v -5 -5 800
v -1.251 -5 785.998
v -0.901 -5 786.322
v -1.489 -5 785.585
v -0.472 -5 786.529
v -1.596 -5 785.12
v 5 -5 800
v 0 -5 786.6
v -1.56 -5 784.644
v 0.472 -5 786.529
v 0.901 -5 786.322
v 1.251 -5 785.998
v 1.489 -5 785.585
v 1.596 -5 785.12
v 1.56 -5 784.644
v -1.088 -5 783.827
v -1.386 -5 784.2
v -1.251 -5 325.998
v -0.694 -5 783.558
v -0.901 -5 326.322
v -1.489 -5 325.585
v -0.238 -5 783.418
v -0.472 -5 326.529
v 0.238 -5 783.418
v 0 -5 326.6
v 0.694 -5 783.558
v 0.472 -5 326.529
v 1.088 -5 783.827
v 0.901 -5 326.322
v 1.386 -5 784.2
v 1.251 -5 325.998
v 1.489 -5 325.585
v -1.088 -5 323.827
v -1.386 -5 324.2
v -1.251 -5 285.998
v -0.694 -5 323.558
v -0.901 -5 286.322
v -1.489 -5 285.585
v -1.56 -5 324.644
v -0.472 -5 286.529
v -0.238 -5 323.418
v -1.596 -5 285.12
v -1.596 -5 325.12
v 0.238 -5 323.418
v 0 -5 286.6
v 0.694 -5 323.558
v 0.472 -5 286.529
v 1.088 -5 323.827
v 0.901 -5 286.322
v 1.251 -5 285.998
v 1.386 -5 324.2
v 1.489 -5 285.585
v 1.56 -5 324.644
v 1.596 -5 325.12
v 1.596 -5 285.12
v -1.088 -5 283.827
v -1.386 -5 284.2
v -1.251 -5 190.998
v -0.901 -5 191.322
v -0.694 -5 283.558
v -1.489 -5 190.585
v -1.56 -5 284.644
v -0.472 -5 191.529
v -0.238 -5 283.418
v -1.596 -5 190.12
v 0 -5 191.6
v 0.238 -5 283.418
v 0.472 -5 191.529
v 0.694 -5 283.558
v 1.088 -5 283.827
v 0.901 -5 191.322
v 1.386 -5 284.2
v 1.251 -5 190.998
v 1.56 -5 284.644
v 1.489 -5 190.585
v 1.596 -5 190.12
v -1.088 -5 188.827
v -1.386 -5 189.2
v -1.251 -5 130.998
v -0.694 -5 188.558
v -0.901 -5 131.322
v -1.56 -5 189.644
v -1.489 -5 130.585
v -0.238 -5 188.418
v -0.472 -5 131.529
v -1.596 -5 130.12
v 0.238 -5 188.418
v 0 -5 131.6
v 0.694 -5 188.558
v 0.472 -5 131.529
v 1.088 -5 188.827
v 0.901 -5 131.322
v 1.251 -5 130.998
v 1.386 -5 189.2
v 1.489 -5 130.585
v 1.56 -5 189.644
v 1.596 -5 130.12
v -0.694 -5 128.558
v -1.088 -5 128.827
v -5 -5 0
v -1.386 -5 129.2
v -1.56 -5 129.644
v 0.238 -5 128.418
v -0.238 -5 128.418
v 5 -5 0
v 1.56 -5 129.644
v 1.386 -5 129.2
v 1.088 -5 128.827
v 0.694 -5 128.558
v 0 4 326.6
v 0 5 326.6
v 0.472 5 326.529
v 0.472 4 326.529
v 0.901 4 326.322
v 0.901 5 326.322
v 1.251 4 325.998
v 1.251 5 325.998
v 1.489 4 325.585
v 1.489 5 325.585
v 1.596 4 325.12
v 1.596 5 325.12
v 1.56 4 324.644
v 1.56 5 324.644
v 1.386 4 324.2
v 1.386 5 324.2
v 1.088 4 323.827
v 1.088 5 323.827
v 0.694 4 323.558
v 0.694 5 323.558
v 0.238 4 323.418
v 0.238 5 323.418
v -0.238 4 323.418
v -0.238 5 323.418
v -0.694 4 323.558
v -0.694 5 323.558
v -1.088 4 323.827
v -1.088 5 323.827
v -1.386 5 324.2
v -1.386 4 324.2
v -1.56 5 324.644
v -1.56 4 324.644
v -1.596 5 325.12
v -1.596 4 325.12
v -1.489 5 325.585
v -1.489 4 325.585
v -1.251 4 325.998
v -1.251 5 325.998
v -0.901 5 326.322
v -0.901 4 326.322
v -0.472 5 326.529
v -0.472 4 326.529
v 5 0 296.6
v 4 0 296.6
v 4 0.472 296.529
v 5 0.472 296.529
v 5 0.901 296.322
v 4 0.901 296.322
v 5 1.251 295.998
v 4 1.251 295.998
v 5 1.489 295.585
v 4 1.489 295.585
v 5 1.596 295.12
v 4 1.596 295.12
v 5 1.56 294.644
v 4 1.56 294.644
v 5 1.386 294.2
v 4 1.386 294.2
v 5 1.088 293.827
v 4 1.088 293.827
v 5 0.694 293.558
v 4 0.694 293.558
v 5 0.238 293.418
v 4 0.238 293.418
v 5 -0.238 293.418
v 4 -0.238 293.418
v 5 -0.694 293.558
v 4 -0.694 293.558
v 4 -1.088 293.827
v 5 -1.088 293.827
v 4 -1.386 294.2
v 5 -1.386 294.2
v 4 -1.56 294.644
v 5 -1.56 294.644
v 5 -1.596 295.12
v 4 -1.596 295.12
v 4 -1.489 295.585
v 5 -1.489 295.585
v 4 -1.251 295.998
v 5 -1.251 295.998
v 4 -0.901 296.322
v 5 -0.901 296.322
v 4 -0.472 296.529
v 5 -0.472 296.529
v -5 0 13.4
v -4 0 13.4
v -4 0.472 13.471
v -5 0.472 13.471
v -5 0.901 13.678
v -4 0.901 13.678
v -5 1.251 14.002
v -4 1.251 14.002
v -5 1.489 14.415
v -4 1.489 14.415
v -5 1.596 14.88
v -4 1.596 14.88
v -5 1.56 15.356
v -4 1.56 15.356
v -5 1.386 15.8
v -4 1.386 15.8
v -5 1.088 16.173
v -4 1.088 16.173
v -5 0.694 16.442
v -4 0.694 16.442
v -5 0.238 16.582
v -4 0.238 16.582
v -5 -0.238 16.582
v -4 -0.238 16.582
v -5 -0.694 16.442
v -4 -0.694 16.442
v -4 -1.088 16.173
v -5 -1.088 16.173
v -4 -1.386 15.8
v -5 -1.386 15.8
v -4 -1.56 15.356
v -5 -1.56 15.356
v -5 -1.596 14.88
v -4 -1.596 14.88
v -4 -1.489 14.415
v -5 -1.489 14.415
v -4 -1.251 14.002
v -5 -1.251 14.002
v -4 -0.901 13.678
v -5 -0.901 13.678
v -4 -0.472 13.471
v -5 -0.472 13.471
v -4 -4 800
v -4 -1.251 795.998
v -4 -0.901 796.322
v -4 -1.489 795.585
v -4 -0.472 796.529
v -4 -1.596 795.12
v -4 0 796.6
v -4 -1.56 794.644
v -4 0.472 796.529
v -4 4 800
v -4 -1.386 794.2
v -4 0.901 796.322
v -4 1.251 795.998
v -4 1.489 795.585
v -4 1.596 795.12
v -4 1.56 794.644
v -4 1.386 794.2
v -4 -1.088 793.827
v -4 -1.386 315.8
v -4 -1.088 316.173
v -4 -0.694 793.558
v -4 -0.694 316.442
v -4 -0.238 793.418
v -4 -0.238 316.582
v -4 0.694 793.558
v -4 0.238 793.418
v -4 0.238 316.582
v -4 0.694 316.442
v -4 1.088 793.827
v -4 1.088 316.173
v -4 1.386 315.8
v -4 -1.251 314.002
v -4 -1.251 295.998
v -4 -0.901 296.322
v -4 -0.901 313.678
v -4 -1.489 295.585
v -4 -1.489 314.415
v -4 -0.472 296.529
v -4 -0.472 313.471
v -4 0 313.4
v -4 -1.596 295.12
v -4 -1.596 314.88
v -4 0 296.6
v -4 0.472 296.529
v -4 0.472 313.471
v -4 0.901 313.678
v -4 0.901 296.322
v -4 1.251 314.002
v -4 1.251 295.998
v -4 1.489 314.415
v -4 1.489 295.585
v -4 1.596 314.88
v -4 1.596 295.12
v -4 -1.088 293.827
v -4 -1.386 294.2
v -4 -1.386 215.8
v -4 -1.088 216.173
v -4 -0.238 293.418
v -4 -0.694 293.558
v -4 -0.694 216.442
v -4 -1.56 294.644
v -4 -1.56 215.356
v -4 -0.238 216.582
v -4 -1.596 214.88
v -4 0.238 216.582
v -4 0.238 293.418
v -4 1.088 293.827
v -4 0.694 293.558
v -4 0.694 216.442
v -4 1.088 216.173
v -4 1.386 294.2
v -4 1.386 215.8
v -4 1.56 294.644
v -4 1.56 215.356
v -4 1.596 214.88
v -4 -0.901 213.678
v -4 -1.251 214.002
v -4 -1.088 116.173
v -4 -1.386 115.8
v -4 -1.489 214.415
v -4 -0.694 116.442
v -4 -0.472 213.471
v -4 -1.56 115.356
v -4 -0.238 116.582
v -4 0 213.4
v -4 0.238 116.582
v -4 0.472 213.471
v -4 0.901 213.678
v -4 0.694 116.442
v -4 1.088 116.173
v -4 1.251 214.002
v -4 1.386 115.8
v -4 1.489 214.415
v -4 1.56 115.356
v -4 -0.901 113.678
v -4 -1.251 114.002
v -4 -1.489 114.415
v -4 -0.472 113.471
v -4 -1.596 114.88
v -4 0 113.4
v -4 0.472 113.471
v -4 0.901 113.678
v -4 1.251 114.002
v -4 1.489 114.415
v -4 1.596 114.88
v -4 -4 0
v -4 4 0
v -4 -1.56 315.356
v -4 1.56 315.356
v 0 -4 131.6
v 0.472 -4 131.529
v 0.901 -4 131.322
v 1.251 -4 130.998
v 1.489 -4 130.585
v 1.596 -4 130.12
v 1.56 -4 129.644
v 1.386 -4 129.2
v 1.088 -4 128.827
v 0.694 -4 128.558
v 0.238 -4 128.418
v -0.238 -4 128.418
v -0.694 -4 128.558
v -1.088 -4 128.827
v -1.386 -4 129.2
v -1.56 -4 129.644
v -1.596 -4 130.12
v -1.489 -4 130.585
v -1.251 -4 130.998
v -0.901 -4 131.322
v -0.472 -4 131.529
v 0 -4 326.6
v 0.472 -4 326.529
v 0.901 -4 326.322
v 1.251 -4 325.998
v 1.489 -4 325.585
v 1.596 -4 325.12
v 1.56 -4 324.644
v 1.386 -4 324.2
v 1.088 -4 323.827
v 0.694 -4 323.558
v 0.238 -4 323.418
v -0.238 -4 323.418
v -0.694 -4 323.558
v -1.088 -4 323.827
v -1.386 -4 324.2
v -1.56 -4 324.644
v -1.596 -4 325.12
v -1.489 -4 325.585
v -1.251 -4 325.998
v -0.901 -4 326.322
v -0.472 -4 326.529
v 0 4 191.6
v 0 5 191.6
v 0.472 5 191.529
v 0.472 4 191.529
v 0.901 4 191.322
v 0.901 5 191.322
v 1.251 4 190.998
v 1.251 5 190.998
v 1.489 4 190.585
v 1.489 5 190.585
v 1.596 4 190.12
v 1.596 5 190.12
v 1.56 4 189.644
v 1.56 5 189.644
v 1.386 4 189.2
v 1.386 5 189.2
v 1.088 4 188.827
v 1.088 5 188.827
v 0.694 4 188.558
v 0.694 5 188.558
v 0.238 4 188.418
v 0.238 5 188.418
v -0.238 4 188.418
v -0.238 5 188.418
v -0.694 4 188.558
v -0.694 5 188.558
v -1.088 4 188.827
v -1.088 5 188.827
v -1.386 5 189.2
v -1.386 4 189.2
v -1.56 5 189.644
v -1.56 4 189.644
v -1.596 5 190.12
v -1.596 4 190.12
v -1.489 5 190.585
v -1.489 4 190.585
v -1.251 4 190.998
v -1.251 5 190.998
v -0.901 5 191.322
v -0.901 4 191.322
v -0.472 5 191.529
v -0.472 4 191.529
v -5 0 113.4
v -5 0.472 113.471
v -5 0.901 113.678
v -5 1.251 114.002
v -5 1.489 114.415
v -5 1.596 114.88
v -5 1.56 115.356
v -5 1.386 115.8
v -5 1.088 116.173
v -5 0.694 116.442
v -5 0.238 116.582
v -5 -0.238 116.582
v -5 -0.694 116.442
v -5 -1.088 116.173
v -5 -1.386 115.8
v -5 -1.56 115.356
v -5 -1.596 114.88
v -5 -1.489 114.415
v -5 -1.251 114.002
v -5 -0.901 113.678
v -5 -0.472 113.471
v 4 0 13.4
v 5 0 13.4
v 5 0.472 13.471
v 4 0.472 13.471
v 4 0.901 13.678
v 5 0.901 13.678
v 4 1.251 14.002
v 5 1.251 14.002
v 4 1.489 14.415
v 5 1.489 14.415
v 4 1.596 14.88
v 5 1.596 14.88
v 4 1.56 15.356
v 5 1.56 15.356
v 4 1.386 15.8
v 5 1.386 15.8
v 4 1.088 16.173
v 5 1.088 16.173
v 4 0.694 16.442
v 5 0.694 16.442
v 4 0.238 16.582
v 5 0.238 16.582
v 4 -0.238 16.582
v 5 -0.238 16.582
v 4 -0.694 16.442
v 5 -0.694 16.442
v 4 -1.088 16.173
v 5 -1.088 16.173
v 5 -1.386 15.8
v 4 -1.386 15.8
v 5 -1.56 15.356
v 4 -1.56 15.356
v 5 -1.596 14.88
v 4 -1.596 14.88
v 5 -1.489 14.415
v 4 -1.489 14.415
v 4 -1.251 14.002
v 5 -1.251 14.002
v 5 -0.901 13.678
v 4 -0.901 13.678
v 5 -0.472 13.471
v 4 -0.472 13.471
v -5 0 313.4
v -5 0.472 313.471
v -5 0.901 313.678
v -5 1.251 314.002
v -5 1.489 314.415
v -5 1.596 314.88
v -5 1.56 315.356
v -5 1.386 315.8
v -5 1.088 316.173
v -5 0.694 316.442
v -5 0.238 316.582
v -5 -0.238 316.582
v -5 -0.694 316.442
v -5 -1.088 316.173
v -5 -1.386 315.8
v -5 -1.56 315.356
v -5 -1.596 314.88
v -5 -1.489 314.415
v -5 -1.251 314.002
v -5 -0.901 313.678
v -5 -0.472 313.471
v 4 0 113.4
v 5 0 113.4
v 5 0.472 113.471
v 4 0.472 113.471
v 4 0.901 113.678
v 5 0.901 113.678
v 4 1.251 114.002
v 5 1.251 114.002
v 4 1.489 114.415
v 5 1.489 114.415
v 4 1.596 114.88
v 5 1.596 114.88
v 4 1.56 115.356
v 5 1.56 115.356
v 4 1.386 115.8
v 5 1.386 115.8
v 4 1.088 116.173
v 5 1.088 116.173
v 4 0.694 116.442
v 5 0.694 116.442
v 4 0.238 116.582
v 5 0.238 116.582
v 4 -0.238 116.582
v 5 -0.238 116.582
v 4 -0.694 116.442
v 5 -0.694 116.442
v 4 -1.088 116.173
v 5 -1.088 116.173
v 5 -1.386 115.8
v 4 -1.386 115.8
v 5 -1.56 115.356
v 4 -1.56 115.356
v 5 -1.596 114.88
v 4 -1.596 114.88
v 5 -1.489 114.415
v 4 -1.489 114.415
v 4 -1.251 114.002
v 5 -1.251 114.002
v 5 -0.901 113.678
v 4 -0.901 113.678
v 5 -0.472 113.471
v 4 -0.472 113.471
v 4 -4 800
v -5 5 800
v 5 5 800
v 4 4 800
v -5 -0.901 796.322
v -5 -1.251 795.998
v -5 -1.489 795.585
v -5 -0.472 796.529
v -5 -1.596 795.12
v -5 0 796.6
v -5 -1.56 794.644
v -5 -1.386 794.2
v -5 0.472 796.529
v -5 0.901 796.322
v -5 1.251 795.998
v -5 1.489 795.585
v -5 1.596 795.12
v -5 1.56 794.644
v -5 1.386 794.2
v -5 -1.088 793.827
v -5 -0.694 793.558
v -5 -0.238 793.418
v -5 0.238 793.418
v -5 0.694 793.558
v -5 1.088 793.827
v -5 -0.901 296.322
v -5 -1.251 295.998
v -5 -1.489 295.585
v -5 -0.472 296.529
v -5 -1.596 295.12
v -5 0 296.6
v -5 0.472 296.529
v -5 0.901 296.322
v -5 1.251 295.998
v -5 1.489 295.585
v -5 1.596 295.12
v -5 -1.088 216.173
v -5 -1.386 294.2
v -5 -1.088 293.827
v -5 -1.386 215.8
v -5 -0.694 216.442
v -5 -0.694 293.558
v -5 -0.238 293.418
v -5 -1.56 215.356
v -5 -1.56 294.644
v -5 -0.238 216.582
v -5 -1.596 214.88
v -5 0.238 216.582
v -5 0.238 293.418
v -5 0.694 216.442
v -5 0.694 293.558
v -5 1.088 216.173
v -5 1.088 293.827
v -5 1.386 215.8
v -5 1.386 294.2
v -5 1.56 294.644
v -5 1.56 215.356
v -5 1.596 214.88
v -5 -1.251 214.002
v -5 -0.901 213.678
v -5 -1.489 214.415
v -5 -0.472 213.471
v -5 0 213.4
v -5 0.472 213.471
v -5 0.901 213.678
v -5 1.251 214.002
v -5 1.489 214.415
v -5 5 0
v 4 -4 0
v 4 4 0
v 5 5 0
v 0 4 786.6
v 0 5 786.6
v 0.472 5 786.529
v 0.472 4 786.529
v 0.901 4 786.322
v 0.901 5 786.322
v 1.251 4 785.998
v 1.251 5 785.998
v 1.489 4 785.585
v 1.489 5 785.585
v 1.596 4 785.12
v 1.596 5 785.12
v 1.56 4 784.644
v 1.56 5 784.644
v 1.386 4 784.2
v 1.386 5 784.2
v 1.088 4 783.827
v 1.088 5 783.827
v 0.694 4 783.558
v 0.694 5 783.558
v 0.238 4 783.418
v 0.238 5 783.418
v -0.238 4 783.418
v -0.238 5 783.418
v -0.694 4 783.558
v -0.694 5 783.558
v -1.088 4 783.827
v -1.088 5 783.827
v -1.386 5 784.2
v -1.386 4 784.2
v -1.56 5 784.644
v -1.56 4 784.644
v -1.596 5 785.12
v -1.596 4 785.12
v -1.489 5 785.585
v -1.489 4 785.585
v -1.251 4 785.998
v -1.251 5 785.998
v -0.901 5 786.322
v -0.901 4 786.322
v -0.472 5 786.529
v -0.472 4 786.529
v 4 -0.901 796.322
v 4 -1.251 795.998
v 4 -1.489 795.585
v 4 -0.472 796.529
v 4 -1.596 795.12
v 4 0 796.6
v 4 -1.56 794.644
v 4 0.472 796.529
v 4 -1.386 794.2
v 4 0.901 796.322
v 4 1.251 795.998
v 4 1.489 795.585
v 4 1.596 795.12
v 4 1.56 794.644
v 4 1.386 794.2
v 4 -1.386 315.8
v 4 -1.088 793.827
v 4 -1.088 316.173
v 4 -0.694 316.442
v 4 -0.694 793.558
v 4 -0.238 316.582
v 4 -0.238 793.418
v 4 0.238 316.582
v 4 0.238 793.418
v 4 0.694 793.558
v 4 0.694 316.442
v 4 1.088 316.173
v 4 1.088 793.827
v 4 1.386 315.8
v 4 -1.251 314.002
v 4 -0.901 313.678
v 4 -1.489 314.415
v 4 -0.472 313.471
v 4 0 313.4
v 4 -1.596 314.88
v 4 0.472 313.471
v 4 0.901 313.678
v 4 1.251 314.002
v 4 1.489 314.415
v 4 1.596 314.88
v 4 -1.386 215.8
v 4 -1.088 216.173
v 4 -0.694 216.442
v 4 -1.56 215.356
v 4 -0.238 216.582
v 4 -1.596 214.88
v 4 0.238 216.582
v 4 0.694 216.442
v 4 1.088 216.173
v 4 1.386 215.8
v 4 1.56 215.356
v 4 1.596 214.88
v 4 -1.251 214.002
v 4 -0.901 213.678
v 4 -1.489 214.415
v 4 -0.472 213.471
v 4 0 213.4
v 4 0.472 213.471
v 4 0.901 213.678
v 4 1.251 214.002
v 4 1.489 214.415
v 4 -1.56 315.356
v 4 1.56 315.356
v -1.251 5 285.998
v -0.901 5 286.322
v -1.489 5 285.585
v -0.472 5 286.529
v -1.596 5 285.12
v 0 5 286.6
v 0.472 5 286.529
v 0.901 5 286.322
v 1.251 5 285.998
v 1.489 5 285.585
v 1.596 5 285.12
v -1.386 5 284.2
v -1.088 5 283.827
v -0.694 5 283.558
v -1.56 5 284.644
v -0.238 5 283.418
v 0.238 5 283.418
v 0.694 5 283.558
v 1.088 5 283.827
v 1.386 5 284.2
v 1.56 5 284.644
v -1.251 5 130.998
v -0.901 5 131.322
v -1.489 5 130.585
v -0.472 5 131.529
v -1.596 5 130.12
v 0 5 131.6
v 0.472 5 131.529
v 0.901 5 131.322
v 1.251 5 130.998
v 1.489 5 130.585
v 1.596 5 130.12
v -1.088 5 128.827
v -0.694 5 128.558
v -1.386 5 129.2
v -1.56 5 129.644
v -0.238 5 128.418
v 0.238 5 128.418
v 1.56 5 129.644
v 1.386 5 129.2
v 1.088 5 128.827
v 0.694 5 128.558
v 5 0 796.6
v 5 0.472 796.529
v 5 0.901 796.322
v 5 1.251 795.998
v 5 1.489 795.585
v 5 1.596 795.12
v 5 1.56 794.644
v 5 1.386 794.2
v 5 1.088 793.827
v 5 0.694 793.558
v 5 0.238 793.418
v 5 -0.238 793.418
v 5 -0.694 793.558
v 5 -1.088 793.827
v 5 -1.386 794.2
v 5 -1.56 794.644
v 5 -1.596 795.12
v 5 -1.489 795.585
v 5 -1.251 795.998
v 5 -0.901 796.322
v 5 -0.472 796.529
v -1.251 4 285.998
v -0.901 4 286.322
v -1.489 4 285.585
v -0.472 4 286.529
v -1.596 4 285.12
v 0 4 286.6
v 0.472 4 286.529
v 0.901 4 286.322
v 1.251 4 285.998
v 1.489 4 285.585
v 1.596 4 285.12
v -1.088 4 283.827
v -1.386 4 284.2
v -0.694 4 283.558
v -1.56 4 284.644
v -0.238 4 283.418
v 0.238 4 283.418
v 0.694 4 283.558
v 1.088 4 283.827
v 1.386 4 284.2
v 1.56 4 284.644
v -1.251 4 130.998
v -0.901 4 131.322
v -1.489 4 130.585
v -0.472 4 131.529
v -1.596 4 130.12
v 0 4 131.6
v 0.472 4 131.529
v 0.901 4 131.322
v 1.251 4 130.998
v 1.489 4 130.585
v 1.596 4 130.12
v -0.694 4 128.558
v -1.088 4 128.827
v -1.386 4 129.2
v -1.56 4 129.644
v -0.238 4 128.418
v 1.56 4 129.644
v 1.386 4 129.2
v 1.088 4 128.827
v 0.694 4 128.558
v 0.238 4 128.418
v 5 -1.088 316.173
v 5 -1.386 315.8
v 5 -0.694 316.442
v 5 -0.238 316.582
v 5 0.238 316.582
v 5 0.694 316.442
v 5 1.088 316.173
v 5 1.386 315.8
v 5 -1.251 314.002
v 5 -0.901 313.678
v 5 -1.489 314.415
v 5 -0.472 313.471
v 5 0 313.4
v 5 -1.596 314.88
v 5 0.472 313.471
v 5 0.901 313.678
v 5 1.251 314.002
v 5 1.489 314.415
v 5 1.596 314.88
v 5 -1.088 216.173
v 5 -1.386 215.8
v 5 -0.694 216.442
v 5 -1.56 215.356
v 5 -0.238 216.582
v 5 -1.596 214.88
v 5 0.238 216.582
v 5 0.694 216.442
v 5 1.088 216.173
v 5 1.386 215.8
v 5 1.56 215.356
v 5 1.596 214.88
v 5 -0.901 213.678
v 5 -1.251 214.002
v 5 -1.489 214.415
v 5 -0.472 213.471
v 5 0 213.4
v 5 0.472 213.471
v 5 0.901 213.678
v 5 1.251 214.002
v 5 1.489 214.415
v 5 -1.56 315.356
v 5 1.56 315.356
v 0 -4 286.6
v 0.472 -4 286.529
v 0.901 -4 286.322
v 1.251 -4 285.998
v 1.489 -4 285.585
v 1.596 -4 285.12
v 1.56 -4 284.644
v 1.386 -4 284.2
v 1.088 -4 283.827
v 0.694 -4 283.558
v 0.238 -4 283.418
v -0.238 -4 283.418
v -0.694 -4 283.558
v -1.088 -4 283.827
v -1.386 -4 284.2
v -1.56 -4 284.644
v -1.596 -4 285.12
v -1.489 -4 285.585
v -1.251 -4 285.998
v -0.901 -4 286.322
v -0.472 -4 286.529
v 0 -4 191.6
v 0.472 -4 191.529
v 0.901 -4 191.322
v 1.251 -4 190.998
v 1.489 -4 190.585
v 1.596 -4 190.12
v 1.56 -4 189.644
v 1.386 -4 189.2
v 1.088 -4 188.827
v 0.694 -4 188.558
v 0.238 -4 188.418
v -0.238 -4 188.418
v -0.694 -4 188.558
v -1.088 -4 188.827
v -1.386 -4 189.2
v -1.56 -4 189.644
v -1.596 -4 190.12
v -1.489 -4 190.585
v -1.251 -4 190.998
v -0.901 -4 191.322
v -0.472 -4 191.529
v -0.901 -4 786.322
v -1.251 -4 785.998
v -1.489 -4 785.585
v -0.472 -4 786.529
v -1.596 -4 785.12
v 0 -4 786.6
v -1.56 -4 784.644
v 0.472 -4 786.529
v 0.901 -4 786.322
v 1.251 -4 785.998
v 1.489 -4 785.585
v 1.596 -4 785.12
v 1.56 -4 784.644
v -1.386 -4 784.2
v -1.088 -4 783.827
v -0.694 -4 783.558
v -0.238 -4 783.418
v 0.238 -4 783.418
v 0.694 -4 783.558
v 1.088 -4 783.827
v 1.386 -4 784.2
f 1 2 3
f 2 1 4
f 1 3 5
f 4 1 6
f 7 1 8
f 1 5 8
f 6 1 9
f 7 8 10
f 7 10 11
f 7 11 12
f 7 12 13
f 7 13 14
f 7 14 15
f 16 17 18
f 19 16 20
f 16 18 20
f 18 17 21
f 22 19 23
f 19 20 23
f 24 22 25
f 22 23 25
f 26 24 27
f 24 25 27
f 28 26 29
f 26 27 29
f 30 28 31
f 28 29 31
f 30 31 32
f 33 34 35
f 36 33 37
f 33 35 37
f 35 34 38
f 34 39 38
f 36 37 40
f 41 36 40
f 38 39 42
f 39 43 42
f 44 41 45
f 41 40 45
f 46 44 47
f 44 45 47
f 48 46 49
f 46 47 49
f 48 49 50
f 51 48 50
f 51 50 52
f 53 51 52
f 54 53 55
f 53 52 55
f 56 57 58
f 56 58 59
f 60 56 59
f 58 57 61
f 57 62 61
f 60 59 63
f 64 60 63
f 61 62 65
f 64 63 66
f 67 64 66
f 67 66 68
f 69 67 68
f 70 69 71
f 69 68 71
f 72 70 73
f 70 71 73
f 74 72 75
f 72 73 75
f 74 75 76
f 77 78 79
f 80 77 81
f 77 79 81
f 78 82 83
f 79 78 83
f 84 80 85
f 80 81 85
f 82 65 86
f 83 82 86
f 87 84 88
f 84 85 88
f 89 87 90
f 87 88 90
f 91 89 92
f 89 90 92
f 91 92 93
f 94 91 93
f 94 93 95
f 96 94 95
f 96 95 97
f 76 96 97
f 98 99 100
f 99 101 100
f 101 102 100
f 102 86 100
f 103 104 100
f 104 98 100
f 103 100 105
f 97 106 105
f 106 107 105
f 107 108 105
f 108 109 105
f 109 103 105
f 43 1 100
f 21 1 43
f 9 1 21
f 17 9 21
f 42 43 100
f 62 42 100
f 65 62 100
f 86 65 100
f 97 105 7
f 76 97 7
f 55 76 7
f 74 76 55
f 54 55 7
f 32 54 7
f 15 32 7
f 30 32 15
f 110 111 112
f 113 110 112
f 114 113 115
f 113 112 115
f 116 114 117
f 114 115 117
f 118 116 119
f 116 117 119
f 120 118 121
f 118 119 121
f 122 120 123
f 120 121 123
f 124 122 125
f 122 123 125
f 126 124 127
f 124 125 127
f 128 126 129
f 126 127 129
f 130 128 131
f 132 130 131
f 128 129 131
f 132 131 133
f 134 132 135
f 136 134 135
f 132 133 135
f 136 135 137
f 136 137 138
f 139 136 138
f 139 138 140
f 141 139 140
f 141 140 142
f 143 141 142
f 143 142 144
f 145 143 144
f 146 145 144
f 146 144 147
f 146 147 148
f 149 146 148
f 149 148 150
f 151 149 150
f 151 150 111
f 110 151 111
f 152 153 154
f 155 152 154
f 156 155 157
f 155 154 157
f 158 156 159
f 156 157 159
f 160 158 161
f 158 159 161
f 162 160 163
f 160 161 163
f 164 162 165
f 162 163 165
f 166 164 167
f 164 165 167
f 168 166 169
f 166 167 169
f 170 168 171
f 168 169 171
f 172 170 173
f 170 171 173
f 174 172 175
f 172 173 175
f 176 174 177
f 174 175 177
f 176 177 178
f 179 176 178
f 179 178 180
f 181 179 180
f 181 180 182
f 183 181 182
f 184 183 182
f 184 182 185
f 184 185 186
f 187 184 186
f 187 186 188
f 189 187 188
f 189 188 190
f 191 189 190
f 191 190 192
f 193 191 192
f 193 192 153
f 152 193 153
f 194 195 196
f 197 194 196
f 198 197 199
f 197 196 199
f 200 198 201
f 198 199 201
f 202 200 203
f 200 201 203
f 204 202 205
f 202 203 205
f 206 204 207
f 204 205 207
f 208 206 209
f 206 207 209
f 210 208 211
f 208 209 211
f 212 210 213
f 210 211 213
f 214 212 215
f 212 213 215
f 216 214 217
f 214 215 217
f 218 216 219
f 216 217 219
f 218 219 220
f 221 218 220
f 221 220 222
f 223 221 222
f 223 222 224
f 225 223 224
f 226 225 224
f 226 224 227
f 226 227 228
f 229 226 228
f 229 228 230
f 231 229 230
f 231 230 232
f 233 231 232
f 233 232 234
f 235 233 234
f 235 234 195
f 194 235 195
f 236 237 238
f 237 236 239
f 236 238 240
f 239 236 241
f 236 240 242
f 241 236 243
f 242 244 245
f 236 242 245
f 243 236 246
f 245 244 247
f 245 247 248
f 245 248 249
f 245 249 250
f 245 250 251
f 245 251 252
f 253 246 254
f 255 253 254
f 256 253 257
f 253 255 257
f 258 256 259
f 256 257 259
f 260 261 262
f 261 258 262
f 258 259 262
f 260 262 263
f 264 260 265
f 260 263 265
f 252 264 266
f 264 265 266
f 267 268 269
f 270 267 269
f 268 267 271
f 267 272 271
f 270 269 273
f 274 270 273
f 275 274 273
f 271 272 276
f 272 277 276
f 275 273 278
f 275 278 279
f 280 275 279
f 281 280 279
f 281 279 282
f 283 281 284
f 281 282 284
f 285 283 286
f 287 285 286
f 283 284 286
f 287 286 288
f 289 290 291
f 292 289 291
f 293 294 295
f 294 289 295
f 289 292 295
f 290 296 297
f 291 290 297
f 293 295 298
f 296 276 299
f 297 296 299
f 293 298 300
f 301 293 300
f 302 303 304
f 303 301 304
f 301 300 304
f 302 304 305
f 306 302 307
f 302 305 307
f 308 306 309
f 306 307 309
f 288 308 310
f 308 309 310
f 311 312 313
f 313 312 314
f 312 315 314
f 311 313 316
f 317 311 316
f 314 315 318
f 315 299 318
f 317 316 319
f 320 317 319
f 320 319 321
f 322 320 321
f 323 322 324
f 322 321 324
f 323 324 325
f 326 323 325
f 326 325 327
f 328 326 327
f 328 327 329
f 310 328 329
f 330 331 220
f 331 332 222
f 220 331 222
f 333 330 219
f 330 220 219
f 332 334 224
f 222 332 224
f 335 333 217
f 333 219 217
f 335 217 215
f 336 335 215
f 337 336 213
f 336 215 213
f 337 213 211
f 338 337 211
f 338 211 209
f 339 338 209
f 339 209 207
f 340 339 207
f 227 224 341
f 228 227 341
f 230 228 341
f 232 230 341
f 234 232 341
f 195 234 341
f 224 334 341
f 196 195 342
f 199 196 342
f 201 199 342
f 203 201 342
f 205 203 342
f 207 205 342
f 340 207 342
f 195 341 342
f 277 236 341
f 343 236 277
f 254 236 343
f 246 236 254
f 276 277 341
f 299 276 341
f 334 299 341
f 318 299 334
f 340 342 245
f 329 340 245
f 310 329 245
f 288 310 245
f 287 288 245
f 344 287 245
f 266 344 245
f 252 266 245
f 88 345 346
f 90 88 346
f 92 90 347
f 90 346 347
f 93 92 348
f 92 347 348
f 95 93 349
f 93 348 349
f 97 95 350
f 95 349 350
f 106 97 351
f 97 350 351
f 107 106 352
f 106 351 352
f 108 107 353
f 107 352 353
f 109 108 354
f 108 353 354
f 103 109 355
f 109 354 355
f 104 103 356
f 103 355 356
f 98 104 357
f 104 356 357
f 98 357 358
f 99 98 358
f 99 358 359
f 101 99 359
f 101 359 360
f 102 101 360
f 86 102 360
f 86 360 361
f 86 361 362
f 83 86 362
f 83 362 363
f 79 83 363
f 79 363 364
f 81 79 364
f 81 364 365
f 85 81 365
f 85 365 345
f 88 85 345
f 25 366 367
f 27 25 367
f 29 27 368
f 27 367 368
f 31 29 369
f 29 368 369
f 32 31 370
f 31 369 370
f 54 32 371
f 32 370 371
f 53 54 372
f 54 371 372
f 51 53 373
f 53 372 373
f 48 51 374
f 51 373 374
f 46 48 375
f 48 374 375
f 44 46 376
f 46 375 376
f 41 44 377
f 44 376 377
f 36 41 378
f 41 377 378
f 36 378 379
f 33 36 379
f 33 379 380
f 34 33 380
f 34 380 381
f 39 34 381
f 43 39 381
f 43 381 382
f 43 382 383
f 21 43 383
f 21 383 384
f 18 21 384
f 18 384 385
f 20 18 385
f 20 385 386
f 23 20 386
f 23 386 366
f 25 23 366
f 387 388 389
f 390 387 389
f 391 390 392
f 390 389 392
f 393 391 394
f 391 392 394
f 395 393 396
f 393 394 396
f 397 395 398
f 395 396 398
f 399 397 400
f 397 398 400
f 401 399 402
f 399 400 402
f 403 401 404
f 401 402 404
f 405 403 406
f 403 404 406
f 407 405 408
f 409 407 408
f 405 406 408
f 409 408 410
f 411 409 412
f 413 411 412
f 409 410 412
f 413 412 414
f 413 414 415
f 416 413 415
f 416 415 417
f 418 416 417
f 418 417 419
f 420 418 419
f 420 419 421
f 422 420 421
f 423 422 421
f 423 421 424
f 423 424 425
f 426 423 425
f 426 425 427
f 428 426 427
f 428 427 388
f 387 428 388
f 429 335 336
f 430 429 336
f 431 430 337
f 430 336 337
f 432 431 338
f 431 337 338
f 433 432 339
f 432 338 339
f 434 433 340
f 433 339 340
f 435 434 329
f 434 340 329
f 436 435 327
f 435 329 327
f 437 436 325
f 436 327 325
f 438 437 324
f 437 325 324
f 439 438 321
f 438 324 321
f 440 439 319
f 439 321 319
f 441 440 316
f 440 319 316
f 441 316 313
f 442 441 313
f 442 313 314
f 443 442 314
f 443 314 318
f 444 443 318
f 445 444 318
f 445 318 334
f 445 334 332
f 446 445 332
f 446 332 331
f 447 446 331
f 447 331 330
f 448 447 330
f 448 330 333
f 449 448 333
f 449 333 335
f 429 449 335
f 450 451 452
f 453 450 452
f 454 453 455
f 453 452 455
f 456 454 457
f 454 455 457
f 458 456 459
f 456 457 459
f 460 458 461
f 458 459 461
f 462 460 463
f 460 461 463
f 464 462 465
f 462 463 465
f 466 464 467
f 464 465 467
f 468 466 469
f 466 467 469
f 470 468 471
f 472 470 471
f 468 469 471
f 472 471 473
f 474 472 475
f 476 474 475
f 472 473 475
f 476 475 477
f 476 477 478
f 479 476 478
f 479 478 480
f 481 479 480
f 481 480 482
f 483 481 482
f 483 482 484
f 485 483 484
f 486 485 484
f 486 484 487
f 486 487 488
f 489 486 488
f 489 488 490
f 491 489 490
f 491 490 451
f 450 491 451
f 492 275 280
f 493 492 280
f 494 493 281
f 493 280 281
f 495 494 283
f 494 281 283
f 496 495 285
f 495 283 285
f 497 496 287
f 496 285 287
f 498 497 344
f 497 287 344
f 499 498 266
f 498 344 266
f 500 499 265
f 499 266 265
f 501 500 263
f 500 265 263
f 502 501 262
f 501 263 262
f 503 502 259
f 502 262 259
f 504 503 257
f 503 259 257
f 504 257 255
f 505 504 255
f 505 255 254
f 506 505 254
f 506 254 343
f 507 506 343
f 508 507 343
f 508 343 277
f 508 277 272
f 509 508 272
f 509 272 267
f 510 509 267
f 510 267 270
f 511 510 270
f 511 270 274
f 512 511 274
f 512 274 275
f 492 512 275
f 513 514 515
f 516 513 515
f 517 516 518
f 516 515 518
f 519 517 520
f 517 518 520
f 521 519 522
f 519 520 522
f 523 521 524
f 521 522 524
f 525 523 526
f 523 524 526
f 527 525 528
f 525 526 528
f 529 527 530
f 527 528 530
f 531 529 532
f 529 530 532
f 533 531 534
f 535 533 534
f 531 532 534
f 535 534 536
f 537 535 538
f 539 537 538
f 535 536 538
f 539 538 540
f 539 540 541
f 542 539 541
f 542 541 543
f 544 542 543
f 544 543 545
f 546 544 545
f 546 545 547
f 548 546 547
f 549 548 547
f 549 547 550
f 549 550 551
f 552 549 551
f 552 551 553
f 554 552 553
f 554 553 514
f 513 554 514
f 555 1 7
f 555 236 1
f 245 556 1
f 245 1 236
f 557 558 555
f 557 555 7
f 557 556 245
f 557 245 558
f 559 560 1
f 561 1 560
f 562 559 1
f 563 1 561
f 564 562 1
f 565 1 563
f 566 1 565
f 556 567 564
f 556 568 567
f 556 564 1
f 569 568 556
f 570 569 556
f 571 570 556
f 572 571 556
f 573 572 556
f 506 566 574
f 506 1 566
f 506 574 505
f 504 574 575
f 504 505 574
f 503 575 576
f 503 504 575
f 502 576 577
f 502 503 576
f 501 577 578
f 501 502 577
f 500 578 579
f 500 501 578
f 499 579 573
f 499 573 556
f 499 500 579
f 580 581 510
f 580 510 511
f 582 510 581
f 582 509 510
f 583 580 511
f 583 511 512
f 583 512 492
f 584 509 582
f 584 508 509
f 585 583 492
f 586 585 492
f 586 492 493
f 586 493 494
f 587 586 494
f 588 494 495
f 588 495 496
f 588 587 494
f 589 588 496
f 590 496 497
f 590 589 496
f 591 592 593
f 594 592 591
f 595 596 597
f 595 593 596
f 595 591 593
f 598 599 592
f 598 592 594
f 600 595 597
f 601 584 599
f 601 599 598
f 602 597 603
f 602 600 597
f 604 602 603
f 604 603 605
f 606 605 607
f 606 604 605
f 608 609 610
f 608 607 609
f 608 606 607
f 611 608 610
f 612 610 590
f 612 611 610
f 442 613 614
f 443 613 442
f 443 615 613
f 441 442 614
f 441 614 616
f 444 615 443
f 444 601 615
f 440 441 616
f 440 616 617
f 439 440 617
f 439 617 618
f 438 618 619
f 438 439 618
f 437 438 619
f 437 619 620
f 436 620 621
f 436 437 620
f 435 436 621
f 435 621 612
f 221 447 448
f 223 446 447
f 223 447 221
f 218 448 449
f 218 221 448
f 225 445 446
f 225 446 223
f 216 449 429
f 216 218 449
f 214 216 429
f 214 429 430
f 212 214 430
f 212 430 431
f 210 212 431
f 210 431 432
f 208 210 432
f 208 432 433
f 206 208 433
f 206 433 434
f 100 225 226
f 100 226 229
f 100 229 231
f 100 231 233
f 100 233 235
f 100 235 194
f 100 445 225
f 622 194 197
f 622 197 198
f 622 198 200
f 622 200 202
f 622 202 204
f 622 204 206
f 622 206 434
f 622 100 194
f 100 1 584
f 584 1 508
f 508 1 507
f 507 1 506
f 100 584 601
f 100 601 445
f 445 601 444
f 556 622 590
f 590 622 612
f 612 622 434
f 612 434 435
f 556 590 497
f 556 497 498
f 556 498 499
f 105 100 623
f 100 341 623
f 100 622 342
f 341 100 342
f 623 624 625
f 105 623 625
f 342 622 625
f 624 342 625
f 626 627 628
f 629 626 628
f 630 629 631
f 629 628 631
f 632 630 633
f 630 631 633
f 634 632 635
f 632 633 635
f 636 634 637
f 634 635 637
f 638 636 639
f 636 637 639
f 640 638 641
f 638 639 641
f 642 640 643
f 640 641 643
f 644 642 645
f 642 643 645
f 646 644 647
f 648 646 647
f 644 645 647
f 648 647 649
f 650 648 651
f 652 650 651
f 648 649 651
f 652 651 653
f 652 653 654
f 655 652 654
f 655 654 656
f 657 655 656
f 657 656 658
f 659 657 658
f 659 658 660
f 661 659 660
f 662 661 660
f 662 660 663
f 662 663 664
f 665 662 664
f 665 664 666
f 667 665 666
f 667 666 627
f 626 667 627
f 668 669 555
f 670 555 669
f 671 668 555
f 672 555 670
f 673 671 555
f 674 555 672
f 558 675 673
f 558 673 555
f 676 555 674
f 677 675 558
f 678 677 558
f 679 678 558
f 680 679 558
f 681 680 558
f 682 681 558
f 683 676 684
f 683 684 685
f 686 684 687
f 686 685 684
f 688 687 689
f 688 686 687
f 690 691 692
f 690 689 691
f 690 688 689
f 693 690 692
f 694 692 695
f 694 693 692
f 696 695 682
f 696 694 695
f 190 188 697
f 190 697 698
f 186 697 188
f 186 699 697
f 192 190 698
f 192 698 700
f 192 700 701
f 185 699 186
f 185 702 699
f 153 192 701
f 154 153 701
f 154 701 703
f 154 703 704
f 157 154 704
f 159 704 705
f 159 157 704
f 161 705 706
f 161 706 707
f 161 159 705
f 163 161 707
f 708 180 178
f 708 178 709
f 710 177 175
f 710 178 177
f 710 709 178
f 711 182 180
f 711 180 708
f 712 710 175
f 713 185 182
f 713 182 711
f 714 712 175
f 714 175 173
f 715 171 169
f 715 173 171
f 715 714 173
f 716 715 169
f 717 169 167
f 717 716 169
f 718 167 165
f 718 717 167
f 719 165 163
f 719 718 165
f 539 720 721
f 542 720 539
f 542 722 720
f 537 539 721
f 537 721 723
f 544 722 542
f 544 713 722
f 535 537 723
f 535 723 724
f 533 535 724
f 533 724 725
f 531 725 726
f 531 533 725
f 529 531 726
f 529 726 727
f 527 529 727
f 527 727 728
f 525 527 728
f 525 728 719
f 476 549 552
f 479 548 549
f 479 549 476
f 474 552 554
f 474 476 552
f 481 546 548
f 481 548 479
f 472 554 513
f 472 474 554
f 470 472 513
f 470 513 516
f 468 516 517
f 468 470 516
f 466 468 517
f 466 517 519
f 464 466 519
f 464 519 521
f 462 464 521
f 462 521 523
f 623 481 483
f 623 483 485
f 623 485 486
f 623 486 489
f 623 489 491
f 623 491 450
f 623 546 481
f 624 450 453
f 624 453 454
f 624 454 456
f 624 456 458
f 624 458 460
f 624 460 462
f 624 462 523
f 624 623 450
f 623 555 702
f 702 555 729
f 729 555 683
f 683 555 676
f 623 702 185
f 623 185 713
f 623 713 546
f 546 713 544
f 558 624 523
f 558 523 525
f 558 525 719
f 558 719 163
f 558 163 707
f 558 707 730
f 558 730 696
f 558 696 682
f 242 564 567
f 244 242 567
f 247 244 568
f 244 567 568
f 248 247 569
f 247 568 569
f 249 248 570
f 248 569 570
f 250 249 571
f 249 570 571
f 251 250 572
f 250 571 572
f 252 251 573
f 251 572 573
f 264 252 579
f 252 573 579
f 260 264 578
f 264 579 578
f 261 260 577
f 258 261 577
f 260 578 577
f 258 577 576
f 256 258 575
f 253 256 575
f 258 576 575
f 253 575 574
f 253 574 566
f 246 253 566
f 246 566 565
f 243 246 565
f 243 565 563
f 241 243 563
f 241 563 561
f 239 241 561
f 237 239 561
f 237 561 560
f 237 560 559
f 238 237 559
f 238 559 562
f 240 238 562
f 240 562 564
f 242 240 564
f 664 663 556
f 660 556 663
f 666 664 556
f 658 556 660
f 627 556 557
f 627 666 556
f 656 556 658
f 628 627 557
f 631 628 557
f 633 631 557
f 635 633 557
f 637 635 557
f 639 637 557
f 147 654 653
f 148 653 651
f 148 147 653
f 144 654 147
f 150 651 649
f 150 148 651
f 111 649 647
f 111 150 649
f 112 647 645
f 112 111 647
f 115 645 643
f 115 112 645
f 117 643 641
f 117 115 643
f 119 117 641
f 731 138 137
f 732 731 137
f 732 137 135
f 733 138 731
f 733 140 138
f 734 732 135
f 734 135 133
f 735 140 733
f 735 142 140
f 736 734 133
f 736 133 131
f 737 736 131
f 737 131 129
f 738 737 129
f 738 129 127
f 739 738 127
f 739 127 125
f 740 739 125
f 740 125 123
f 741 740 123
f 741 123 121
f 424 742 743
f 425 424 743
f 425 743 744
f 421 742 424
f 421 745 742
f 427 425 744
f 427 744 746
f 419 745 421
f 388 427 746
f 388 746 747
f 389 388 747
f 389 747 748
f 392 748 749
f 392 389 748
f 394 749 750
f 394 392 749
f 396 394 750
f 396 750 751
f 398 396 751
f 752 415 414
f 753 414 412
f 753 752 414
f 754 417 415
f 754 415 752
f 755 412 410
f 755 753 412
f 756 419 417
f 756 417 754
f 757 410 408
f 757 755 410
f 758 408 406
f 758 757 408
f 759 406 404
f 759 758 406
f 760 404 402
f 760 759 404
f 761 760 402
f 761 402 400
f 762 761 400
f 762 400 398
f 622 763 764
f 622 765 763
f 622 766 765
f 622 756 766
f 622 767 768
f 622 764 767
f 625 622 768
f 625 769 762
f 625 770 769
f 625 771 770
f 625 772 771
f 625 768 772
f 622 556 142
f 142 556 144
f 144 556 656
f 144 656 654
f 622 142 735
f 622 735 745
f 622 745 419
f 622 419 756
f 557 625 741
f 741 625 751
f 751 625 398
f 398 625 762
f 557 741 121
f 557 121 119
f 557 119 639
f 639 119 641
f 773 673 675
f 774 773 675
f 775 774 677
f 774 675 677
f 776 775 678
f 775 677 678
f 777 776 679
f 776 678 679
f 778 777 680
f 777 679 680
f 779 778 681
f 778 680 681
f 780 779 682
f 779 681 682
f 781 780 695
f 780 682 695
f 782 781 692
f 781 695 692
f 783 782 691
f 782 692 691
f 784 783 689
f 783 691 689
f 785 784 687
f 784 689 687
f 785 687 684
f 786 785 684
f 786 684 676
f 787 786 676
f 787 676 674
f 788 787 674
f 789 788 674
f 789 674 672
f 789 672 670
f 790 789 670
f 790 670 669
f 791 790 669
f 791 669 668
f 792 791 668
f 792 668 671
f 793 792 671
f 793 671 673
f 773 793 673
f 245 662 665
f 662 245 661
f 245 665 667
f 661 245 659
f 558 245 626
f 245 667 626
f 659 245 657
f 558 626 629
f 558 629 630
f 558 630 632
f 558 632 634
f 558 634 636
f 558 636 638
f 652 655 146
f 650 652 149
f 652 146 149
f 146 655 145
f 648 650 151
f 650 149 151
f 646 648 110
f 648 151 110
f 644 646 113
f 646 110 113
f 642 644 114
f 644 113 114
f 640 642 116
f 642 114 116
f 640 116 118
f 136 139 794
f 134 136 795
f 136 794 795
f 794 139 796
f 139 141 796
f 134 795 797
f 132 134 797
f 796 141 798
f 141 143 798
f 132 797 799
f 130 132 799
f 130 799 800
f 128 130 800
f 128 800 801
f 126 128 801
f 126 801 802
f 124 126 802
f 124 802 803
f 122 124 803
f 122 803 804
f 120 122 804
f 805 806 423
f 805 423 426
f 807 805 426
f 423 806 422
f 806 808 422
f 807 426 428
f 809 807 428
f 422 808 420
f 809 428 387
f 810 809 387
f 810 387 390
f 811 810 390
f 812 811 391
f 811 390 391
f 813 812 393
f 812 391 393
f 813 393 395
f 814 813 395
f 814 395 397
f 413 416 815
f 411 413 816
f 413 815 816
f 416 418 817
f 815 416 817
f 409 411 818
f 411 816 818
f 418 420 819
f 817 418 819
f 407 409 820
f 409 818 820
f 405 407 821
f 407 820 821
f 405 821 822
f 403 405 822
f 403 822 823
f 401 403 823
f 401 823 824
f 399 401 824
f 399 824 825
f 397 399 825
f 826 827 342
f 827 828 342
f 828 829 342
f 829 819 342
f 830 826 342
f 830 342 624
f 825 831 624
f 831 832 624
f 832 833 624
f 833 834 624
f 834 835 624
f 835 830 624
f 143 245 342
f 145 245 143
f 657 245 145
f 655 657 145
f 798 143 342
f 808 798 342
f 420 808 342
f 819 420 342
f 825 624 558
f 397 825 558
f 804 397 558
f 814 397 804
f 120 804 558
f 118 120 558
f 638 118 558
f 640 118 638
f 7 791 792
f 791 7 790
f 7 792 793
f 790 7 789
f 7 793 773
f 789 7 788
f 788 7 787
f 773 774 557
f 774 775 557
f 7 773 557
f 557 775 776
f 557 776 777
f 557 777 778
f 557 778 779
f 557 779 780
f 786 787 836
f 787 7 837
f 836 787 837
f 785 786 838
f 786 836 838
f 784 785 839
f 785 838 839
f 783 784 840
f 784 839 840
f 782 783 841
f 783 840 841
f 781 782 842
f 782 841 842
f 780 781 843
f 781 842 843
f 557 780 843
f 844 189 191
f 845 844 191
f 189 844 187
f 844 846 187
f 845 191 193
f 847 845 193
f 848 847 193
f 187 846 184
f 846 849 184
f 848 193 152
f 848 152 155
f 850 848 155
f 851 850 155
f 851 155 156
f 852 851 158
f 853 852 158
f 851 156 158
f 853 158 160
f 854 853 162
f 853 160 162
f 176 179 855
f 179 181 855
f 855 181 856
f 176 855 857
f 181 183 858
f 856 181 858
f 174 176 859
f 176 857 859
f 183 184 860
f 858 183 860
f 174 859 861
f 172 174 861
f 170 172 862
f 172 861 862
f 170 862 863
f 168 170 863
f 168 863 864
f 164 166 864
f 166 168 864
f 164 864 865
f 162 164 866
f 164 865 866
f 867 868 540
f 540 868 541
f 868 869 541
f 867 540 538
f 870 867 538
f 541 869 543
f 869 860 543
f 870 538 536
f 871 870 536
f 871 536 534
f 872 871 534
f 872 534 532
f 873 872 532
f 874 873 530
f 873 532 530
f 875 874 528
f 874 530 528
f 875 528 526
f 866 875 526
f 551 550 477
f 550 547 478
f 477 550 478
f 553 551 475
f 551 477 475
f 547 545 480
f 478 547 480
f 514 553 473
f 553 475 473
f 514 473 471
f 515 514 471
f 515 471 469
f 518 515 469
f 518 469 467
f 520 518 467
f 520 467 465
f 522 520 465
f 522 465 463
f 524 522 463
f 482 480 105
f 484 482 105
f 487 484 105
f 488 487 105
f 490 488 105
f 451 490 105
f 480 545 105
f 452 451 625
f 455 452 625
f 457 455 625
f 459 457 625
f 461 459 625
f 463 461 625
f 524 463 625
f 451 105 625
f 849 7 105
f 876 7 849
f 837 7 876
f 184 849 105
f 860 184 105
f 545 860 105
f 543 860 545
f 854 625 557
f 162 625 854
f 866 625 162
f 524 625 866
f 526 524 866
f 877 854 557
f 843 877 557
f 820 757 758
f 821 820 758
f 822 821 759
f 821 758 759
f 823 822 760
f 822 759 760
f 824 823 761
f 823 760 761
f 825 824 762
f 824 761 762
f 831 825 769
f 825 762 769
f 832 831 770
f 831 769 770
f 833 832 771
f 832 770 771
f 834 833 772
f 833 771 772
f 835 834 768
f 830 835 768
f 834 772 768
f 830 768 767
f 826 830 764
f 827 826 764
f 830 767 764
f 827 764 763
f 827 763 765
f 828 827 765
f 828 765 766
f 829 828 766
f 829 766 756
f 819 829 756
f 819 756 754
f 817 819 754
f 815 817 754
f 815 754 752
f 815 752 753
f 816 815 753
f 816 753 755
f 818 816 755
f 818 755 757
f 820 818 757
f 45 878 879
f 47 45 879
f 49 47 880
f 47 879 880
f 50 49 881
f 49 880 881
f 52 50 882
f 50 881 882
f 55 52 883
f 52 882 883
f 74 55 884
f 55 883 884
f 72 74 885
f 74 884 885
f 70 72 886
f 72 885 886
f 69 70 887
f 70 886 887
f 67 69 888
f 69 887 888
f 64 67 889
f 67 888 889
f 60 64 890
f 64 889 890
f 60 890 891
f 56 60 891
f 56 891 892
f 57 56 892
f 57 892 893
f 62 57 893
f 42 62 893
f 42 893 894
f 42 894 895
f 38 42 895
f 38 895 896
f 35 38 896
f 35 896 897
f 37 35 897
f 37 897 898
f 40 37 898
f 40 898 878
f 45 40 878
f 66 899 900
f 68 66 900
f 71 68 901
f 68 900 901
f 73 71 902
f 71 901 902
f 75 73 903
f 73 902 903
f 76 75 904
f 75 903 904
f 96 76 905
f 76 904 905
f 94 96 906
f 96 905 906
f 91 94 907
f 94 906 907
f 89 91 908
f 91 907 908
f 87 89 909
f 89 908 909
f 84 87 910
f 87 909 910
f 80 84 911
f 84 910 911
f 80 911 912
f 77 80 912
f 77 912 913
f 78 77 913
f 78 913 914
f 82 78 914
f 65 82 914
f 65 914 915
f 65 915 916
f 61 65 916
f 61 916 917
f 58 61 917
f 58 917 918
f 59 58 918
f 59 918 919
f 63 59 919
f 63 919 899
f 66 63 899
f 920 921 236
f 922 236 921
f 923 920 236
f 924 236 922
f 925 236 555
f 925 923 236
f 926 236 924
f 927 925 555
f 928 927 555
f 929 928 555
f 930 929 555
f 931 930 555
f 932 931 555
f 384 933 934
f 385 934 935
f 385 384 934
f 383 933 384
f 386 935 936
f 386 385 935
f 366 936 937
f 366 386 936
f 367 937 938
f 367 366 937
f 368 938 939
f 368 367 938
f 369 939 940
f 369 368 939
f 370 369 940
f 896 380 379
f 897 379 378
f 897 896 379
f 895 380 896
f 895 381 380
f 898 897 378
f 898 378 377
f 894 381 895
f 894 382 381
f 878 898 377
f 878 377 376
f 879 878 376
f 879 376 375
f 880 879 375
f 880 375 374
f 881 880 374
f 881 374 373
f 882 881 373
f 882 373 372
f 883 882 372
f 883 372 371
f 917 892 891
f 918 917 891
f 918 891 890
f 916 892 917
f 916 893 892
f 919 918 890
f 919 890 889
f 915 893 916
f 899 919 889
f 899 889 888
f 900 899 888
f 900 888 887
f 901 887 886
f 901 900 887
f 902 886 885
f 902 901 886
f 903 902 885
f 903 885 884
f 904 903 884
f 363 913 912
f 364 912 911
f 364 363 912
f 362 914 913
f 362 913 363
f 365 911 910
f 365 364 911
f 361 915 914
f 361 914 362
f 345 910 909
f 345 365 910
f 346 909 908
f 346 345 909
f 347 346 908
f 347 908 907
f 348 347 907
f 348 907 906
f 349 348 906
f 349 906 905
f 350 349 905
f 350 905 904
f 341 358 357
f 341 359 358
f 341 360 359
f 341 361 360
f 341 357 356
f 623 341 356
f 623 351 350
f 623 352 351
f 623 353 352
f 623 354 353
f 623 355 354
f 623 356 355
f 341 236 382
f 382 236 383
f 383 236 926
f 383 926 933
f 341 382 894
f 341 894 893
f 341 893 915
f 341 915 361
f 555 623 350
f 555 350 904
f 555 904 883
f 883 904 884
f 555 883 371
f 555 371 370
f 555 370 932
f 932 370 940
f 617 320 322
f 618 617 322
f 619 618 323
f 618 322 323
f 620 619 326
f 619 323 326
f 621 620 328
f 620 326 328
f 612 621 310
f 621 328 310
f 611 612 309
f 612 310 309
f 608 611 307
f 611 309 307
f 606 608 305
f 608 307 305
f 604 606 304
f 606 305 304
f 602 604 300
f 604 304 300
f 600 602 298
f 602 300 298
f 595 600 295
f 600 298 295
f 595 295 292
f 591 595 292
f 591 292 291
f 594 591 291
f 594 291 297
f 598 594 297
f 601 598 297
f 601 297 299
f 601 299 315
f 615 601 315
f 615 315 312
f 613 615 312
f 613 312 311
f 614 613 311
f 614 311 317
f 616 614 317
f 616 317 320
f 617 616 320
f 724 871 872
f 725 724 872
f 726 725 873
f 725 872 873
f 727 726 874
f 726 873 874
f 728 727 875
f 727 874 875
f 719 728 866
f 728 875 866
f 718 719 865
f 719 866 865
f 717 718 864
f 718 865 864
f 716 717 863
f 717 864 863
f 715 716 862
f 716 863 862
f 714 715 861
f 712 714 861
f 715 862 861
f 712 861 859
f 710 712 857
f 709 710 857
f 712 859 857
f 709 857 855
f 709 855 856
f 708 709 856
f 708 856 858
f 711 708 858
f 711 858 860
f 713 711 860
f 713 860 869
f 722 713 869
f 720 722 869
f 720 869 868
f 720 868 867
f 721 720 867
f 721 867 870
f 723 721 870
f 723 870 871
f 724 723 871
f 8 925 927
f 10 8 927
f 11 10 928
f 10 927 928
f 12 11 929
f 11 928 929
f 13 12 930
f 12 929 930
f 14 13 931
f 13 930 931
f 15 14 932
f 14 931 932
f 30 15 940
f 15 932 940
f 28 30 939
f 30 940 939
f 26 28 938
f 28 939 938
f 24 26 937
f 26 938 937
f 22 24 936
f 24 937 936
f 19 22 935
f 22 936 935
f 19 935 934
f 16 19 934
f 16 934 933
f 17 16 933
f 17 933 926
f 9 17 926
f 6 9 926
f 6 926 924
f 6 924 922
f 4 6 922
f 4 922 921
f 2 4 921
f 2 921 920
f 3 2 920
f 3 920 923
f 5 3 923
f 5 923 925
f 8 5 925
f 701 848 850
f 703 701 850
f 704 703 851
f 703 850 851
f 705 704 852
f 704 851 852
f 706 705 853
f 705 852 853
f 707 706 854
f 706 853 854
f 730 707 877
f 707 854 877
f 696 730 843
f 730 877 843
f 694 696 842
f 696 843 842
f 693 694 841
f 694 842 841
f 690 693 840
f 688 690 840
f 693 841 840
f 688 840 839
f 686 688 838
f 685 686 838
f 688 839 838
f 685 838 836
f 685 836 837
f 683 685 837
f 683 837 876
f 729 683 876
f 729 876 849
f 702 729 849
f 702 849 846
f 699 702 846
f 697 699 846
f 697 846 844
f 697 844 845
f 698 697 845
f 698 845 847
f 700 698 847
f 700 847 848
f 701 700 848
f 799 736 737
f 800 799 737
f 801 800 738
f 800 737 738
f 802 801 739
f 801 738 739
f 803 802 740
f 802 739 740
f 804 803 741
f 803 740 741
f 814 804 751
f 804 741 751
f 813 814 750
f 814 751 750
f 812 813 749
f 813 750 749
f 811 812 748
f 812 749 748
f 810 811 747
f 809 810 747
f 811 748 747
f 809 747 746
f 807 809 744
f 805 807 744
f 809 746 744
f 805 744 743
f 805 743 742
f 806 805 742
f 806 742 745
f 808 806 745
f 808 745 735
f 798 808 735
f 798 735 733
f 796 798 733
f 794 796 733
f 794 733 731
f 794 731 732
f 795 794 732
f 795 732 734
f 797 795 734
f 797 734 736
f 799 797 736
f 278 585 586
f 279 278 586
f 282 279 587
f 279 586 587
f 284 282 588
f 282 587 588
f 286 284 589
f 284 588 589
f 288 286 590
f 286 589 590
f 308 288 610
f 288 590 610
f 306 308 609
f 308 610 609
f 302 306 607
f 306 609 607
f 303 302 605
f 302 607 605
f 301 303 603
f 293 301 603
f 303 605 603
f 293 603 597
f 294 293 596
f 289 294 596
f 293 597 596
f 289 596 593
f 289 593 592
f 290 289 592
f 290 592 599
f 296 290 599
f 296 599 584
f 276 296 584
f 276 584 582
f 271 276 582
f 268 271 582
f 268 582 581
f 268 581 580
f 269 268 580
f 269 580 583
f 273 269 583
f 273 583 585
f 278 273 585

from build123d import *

# Parameters (mm, degrees)
SKETCH_1_W             = 10
SKETCH_1_H             = 10
SKETCH_1_W_2           = 8
SKETCH_1_H_2           = 8
EXTRUDE_1_DEPTH        = 800
SKETCH_3_R             = 1.6
CUT_EXTRUDE_2_DEPTH    = 801.078121186
SKETCH_4_R             = 1.6
CUT_EXTRUDE_3_DEPTH    = 801.078121186
SKETCH_5_R             = 1.6
CUT_EXTRUDE_4_DEPTH    = 801.078121186
PATTERN_LINEAR_1_COUNT = 4
PATTERN_LINEAR_1_PITCH = 100


with BuildPart() as part:
    # ｽｹｯﾁ1 → ﾎﾞｽ - 押し出し1 (new body)
    with BuildSketch(Plane.XY):
        Rectangle(SKETCH_1_W, SKETCH_1_H)
        Rectangle(SKETCH_1_W_2, SKETCH_1_H_2, mode=Mode.SUBTRACT)
    extrude(amount=EXTRUDE_1_DEPTH)

    # ｽｹｯﾁ3 → ｶｯﾄ - 押し出し2 (cut, through all)
    with BuildSketch(Plane(origin=(0, 5, 0), x_dir=(1, 0, 0), z_dir=(0, 1, 0))):
        with Locations(Location((0, -785, 0), (0, 0, 270))):
            Circle(SKETCH_3_R)
        with Locations(Location((0, -190, 0), (0, 0, 270))):
            Circle(SKETCH_3_R)
        with Locations(Location((0, -130, 0), (0, 0, 270))):
            Circle(SKETCH_3_R)
        with Locations(Location((0, -325, 0), (0, 0, 270))):
            Circle(SKETCH_3_R)
        with Locations(Location((0, -285, 0), (0, 0, 270))):
            Circle(SKETCH_3_R)
    extrude(amount=-CUT_EXTRUDE_2_DEPTH, mode=Mode.SUBTRACT)

    # ｽｹｯﾁ4 → ｶｯﾄ - 押し出し3 (cut, through all)
    with BuildSketch(Plane.ZY.offset(5)):
        with Locations((795, 0)):
            Circle(SKETCH_4_R)
        with Locations((295, 0)):
            Circle(SKETCH_4_R)
    extrude(amount=-CUT_EXTRUDE_3_DEPTH, mode=Mode.SUBTRACT)

    # ｽｹｯﾁ5 → ｶｯﾄ - 押し出し4 (cut, through all)
    with BuildSketch(Plane(origin=(5, 0, 0), x_dir=(0, 0, -1), z_dir=(1, 0, 0))):
        with Locations((-15, 0)):
            Circle(SKETCH_5_R)
    cut_extrude_4 = extrude(amount=-CUT_EXTRUDE_4_DEPTH, mode=Mode.SUBTRACT)

    # 直線ﾊﾟﾀｰﾝ1: ｶｯﾄ - 押し出し4 ×4
    with Locations(*[(0, 0, i * PATTERN_LINEAR_1_PITCH) for i in range(1, PATTERN_LINEAR_1_COUNT)]):
        add(cut_extrude_4, mode=Mode.SUBTRACT)


solid = part.part
